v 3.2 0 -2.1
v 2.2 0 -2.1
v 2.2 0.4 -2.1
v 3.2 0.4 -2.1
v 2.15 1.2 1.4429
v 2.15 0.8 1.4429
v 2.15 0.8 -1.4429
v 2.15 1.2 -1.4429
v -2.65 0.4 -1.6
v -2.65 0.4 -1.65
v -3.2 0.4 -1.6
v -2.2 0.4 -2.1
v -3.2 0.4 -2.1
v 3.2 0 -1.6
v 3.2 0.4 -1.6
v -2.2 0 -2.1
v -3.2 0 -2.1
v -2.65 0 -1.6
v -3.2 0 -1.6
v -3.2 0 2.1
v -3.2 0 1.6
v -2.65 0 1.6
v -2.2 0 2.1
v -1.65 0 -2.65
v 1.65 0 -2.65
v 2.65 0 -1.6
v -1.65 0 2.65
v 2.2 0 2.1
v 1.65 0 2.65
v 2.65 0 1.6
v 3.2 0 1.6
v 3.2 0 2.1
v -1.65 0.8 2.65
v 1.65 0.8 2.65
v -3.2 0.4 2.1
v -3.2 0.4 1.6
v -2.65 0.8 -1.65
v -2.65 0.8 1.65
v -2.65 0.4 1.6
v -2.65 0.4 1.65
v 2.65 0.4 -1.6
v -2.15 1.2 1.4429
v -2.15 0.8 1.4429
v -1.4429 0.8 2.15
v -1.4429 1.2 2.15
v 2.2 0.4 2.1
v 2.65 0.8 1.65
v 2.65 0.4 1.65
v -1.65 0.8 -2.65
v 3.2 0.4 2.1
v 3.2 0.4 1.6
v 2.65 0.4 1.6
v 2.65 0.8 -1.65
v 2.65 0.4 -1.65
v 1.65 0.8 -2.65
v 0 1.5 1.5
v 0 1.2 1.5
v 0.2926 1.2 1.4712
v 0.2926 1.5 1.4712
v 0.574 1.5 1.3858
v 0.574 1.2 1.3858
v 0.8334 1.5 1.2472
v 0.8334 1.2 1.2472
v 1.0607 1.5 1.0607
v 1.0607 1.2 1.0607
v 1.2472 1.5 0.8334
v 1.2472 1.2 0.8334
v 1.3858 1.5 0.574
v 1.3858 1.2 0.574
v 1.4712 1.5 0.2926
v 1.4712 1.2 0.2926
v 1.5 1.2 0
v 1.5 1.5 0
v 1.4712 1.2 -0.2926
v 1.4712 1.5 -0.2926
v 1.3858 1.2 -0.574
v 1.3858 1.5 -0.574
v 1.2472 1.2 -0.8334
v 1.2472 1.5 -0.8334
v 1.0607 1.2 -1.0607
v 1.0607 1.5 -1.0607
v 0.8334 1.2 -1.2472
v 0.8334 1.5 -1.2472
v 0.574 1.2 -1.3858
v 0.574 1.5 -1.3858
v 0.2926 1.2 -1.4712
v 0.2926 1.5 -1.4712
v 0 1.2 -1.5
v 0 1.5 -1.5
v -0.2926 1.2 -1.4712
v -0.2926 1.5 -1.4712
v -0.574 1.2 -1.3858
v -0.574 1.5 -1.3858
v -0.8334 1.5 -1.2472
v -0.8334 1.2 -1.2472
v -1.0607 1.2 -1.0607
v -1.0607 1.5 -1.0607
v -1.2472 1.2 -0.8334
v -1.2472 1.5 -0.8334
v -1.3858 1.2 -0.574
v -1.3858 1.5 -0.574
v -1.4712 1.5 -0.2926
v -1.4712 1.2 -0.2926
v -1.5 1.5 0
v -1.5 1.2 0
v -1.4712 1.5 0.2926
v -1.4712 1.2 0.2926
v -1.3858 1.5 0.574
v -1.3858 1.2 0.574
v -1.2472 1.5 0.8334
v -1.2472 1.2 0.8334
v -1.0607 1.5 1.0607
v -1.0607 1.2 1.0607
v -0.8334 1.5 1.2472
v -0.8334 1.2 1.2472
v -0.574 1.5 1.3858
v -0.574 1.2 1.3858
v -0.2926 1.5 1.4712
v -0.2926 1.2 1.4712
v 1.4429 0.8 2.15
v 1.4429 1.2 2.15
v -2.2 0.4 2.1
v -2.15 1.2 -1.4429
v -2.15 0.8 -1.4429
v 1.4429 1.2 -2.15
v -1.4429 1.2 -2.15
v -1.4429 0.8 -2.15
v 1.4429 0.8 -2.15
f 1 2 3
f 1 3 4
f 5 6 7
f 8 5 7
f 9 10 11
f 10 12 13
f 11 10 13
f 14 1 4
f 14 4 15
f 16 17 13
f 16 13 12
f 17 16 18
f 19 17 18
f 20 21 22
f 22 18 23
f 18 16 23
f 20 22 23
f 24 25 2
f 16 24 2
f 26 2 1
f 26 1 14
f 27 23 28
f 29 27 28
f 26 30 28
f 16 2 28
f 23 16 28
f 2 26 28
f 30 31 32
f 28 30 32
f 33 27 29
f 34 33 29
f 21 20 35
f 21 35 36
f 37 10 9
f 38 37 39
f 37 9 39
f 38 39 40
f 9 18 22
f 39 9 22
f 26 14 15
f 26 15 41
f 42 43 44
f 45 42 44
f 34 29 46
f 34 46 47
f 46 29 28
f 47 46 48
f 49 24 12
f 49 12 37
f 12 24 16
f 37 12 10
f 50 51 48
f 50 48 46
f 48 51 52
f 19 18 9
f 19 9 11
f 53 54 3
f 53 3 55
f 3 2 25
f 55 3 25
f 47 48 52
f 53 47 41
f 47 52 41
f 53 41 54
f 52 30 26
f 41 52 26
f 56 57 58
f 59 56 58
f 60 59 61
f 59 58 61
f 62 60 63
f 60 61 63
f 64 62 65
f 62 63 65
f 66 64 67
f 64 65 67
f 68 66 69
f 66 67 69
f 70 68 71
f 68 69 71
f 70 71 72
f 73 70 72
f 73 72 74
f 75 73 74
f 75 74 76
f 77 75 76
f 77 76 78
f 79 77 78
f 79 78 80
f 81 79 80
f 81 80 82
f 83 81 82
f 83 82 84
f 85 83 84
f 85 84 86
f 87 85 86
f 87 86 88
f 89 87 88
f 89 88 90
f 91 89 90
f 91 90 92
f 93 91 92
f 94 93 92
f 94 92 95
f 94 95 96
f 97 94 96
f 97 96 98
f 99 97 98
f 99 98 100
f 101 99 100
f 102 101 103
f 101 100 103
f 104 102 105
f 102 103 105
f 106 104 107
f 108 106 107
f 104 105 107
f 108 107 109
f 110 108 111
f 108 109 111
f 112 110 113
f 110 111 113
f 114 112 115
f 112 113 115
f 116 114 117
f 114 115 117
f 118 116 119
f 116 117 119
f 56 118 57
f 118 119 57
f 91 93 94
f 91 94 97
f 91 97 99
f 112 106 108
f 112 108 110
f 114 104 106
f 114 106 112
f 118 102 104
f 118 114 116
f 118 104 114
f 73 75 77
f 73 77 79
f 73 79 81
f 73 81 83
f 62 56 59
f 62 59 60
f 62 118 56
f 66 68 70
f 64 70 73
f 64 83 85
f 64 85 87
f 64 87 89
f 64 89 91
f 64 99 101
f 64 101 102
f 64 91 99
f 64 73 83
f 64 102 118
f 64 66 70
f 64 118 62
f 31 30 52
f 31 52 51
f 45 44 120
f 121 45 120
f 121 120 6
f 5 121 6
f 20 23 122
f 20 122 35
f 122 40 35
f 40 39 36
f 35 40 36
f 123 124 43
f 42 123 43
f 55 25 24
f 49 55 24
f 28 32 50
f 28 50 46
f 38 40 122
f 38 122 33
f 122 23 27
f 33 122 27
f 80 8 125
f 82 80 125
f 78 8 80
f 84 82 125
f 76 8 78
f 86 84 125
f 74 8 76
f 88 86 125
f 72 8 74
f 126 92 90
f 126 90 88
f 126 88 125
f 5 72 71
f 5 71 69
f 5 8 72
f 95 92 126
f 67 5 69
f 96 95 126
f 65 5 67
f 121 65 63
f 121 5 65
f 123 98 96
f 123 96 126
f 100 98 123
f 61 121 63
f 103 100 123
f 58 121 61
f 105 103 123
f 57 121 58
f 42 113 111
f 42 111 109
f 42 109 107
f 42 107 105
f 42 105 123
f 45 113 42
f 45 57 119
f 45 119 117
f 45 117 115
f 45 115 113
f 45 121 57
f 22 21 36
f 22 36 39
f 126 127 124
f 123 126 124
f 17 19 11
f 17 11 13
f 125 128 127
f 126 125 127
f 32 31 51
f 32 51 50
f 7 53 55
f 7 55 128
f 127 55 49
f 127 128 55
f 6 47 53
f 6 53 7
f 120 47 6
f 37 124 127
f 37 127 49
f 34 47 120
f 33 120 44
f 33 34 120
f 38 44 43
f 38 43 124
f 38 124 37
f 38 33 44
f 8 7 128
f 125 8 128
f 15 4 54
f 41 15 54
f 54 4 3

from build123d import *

# Parameters (mm, degrees)
EXTRUDE1_DEPTH = 0.4
EXTRUDE2_DEPTH = 0.8
EXTRUDE3_DEPTH = 1.2
SKETCH4_R      = 1.5
EXTRUDE7_DEPTH = 1.5


with BuildPart() as part:
    # Sketch1 → Extrude1 (new body)
    with BuildSketch(Plane(origin=(0, 0, 0), x_dir=(1, 0, 0), z_dir=(0, 1, 0))):
        Polygon((-3.2, 2.1), (3.2, 2.1), (3.2, 1.6), (2.2, 1.6), (2.2, -1.6), (3.2, -1.6), (3.2, -2.1), (-3.2, -2.1), (-3.2, -1.6), (-2.2, -1.6), (-2.2, 1.6), (-3.2, 1.6), align=None)
    extrude(amount=EXTRUDE1_DEPTH)

    # Sketch2 → Extrude2 (add)
    with BuildSketch(Plane(origin=(0, 0, 0), x_dir=(-1, 0, 0), z_dir=(0, 1, 0))):
        Polygon((1.65, -2.65), (2.65, -1.65), (2.65, 1.65), (1.65, 2.65), (-1.65, 2.65), (-2.65, 1.65), (-2.65, -1.65), (-1.65, -2.65), align=None)
    extrude(amount=EXTRUDE2_DEPTH)

    # Sketch3 → Extrude3 (add)
    with BuildSketch(Plane(origin=(0, 0, 0), x_dir=(-1, 0, 0), z_dir=(0, 1, 0))):
        Polygon((-2.15, 1.442893219), (-2.15, -1.442893219), (-1.442893219, -2.15), (1.442893219, -2.15), (2.15, -1.442893219), (2.15, 1.442893219), (1.442893219, 2.15), (-1.442893219, 2.15), align=None)
    extrude(amount=EXTRUDE3_DEPTH)

    # Sketch4 → Extrude7 (add)
    with BuildSketch(Plane(origin=(0, 0, 0), x_dir=(-1, 0, 0), z_dir=(0, 1, 0))):
        with Locations(Location((0, 0, 0), (0, 0, 90))):  # turned: the seam where the file's is
            Circle(SKETCH4_R)
    extrude(amount=EXTRUDE7_DEPTH)


solid = part.part
